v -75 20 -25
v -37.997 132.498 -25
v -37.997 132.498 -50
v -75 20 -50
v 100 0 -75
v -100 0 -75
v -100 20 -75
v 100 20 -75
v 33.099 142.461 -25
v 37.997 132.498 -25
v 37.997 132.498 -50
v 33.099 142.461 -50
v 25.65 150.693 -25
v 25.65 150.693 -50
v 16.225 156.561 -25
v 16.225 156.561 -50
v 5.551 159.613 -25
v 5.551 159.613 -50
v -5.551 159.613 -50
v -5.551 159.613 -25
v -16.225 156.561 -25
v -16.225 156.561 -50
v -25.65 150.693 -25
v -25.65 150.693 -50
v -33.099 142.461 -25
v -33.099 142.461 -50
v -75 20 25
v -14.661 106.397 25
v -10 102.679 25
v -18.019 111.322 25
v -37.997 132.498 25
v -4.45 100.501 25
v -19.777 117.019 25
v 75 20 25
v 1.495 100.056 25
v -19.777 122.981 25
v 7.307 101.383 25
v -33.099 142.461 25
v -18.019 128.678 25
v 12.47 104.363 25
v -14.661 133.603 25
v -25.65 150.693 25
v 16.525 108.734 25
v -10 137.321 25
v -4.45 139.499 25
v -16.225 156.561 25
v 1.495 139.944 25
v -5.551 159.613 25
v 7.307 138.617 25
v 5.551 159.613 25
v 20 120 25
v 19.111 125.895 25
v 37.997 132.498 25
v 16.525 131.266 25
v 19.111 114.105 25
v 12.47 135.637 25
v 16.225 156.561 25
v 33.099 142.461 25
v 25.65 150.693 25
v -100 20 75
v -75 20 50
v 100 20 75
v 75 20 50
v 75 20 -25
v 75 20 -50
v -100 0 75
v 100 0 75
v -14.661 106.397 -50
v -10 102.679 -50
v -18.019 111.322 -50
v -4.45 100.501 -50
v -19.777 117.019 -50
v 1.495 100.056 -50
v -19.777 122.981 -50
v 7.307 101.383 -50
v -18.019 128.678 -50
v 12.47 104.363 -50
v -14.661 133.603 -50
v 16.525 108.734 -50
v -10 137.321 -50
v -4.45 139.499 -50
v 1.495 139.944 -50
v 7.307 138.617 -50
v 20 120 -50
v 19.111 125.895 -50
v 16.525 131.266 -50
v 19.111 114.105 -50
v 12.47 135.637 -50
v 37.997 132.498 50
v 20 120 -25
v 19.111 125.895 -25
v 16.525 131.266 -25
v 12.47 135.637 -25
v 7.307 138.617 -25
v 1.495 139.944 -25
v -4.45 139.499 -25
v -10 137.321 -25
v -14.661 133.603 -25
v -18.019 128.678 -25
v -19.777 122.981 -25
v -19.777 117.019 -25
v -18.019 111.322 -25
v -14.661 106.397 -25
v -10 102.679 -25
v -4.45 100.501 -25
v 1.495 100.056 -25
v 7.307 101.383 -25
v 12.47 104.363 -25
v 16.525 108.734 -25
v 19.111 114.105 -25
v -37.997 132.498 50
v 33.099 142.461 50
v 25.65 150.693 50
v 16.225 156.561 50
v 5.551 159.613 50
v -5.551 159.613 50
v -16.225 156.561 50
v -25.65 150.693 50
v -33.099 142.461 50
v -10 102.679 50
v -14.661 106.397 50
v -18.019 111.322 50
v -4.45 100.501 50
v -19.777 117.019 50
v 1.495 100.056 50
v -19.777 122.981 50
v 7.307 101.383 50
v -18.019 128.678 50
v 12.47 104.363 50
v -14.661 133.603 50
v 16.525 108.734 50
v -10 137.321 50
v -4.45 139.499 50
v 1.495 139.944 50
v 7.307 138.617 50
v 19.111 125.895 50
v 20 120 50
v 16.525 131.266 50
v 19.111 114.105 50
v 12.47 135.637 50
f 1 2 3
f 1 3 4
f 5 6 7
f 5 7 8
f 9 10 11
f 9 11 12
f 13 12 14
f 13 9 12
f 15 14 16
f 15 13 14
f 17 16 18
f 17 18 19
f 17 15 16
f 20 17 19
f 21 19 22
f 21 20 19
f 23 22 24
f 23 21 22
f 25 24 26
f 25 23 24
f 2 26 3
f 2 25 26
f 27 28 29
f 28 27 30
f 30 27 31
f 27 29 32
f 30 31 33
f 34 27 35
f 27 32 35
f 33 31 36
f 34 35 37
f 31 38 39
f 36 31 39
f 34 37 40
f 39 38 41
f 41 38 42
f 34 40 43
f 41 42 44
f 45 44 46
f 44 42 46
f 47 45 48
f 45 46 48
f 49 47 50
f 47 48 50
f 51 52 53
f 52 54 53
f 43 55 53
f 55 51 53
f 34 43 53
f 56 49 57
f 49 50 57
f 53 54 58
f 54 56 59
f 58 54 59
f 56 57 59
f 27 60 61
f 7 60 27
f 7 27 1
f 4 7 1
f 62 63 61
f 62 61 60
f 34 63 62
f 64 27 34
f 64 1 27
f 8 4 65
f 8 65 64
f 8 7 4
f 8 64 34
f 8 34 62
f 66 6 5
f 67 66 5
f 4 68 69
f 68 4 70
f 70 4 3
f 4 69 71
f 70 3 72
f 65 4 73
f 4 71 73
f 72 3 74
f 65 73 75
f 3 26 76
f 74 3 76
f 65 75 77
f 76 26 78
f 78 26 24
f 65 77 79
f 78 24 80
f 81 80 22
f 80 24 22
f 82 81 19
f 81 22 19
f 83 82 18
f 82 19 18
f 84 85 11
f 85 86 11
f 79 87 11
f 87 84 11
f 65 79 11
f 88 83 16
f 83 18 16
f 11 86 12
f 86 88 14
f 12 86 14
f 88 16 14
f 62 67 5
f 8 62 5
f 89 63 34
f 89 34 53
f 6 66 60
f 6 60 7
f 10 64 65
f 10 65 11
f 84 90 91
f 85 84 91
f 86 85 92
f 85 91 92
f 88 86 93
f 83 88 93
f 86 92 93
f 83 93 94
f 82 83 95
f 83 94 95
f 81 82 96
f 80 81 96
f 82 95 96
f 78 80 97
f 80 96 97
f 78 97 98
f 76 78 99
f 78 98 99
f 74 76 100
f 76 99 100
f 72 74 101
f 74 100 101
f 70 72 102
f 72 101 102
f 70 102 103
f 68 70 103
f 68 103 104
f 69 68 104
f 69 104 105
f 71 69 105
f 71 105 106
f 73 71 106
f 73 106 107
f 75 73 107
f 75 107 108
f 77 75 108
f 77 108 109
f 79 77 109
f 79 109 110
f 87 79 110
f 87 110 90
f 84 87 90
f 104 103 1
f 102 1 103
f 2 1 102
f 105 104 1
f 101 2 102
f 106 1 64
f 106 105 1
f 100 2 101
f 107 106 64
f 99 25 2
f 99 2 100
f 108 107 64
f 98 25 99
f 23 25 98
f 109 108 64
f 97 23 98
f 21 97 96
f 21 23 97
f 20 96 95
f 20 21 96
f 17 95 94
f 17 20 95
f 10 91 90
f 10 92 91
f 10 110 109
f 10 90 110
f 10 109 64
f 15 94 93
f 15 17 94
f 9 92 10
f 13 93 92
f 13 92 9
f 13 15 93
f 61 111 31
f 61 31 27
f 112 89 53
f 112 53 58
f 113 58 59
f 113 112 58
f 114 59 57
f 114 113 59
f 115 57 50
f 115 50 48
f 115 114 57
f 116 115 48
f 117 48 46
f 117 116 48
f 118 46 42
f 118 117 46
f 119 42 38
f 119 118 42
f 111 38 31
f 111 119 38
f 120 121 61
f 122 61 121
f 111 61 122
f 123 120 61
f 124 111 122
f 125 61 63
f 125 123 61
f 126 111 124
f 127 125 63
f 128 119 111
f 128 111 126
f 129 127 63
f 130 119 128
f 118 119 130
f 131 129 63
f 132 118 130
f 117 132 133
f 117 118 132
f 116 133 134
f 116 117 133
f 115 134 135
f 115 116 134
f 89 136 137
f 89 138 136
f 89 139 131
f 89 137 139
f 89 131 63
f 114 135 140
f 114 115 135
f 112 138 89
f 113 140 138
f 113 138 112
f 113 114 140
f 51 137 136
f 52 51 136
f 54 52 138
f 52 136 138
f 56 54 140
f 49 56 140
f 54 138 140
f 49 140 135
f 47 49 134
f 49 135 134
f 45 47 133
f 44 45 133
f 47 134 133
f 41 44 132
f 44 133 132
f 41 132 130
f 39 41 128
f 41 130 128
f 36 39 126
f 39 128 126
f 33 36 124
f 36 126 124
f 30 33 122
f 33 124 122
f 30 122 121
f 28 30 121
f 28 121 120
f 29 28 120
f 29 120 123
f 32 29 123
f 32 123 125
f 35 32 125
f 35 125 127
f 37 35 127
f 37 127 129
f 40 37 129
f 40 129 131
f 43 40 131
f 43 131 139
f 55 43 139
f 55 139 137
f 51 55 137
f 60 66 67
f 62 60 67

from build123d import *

# Parameters (mm, degrees)
SKETCH1_W           = 200
SKETCH1_H           = 150
BOSS_EXTRUDE1_DEPTH = 20
BOSS_EXTRUDE2_DEPTH = 50
CUT_EXTRUDE1_DEPTH  = 25
SKETCH6_R           = 20
CUT_EXTRUDE2_DEPTH  = 126


with BuildPart() as part:
    # Sketch1 → Boss-Extrude1 (new body)
    with BuildSketch(Plane(origin=(0, 0, 0), x_dir=(1, 0, 0), z_dir=(0, 1, 0))):
        Rectangle(SKETCH1_W, SKETCH1_H)
    extrude(amount=BOSS_EXTRUDE1_DEPTH)

    # Sketch3 → Boss-Extrude2 (add, symmetric)
    with BuildSketch(Plane.XY):
        with BuildLine():
            Line((-37.997361363, 132.498021022), (-75, 20))
            Line((-75, 20), (75, 20))
            Line((75, 20), (37.997361363, 132.498021022))
            ThreePointArc((37.997361363, 132.498021022), (0, 160), (-37.997361363, 132.498021022))
        make_face()
    extrude(amount=BOSS_EXTRUDE2_DEPTH, both=True)

    # Sketch5 → Cut-Extrude1 (cut, symmetric)
    with BuildSketch(Plane.XY):
        with BuildLine():
            Line((-37.997361363, 132.498021022), (-75, 20))
            Line((-75, 20), (75, 20))
            Line((75, 20), (37.997361363, 132.498021022))
            ThreePointArc((37.997361363, 132.498021022), (0, 160), (-37.997361363, 132.498021022))
        make_face()
    extrude(amount=CUT_EXTRUDE1_DEPTH, both=True, mode=Mode.SUBTRACT)

    # Sketch6 → Cut-Extrude2 (cut, through all)
    with BuildSketch(Plane.XY.offset(50)):
        with Locations((0, 120)):
            Circle(SKETCH6_R)
    extrude(amount=-CUT_EXTRUDE2_DEPTH, mode=Mode.SUBTRACT)


solid = part.part
